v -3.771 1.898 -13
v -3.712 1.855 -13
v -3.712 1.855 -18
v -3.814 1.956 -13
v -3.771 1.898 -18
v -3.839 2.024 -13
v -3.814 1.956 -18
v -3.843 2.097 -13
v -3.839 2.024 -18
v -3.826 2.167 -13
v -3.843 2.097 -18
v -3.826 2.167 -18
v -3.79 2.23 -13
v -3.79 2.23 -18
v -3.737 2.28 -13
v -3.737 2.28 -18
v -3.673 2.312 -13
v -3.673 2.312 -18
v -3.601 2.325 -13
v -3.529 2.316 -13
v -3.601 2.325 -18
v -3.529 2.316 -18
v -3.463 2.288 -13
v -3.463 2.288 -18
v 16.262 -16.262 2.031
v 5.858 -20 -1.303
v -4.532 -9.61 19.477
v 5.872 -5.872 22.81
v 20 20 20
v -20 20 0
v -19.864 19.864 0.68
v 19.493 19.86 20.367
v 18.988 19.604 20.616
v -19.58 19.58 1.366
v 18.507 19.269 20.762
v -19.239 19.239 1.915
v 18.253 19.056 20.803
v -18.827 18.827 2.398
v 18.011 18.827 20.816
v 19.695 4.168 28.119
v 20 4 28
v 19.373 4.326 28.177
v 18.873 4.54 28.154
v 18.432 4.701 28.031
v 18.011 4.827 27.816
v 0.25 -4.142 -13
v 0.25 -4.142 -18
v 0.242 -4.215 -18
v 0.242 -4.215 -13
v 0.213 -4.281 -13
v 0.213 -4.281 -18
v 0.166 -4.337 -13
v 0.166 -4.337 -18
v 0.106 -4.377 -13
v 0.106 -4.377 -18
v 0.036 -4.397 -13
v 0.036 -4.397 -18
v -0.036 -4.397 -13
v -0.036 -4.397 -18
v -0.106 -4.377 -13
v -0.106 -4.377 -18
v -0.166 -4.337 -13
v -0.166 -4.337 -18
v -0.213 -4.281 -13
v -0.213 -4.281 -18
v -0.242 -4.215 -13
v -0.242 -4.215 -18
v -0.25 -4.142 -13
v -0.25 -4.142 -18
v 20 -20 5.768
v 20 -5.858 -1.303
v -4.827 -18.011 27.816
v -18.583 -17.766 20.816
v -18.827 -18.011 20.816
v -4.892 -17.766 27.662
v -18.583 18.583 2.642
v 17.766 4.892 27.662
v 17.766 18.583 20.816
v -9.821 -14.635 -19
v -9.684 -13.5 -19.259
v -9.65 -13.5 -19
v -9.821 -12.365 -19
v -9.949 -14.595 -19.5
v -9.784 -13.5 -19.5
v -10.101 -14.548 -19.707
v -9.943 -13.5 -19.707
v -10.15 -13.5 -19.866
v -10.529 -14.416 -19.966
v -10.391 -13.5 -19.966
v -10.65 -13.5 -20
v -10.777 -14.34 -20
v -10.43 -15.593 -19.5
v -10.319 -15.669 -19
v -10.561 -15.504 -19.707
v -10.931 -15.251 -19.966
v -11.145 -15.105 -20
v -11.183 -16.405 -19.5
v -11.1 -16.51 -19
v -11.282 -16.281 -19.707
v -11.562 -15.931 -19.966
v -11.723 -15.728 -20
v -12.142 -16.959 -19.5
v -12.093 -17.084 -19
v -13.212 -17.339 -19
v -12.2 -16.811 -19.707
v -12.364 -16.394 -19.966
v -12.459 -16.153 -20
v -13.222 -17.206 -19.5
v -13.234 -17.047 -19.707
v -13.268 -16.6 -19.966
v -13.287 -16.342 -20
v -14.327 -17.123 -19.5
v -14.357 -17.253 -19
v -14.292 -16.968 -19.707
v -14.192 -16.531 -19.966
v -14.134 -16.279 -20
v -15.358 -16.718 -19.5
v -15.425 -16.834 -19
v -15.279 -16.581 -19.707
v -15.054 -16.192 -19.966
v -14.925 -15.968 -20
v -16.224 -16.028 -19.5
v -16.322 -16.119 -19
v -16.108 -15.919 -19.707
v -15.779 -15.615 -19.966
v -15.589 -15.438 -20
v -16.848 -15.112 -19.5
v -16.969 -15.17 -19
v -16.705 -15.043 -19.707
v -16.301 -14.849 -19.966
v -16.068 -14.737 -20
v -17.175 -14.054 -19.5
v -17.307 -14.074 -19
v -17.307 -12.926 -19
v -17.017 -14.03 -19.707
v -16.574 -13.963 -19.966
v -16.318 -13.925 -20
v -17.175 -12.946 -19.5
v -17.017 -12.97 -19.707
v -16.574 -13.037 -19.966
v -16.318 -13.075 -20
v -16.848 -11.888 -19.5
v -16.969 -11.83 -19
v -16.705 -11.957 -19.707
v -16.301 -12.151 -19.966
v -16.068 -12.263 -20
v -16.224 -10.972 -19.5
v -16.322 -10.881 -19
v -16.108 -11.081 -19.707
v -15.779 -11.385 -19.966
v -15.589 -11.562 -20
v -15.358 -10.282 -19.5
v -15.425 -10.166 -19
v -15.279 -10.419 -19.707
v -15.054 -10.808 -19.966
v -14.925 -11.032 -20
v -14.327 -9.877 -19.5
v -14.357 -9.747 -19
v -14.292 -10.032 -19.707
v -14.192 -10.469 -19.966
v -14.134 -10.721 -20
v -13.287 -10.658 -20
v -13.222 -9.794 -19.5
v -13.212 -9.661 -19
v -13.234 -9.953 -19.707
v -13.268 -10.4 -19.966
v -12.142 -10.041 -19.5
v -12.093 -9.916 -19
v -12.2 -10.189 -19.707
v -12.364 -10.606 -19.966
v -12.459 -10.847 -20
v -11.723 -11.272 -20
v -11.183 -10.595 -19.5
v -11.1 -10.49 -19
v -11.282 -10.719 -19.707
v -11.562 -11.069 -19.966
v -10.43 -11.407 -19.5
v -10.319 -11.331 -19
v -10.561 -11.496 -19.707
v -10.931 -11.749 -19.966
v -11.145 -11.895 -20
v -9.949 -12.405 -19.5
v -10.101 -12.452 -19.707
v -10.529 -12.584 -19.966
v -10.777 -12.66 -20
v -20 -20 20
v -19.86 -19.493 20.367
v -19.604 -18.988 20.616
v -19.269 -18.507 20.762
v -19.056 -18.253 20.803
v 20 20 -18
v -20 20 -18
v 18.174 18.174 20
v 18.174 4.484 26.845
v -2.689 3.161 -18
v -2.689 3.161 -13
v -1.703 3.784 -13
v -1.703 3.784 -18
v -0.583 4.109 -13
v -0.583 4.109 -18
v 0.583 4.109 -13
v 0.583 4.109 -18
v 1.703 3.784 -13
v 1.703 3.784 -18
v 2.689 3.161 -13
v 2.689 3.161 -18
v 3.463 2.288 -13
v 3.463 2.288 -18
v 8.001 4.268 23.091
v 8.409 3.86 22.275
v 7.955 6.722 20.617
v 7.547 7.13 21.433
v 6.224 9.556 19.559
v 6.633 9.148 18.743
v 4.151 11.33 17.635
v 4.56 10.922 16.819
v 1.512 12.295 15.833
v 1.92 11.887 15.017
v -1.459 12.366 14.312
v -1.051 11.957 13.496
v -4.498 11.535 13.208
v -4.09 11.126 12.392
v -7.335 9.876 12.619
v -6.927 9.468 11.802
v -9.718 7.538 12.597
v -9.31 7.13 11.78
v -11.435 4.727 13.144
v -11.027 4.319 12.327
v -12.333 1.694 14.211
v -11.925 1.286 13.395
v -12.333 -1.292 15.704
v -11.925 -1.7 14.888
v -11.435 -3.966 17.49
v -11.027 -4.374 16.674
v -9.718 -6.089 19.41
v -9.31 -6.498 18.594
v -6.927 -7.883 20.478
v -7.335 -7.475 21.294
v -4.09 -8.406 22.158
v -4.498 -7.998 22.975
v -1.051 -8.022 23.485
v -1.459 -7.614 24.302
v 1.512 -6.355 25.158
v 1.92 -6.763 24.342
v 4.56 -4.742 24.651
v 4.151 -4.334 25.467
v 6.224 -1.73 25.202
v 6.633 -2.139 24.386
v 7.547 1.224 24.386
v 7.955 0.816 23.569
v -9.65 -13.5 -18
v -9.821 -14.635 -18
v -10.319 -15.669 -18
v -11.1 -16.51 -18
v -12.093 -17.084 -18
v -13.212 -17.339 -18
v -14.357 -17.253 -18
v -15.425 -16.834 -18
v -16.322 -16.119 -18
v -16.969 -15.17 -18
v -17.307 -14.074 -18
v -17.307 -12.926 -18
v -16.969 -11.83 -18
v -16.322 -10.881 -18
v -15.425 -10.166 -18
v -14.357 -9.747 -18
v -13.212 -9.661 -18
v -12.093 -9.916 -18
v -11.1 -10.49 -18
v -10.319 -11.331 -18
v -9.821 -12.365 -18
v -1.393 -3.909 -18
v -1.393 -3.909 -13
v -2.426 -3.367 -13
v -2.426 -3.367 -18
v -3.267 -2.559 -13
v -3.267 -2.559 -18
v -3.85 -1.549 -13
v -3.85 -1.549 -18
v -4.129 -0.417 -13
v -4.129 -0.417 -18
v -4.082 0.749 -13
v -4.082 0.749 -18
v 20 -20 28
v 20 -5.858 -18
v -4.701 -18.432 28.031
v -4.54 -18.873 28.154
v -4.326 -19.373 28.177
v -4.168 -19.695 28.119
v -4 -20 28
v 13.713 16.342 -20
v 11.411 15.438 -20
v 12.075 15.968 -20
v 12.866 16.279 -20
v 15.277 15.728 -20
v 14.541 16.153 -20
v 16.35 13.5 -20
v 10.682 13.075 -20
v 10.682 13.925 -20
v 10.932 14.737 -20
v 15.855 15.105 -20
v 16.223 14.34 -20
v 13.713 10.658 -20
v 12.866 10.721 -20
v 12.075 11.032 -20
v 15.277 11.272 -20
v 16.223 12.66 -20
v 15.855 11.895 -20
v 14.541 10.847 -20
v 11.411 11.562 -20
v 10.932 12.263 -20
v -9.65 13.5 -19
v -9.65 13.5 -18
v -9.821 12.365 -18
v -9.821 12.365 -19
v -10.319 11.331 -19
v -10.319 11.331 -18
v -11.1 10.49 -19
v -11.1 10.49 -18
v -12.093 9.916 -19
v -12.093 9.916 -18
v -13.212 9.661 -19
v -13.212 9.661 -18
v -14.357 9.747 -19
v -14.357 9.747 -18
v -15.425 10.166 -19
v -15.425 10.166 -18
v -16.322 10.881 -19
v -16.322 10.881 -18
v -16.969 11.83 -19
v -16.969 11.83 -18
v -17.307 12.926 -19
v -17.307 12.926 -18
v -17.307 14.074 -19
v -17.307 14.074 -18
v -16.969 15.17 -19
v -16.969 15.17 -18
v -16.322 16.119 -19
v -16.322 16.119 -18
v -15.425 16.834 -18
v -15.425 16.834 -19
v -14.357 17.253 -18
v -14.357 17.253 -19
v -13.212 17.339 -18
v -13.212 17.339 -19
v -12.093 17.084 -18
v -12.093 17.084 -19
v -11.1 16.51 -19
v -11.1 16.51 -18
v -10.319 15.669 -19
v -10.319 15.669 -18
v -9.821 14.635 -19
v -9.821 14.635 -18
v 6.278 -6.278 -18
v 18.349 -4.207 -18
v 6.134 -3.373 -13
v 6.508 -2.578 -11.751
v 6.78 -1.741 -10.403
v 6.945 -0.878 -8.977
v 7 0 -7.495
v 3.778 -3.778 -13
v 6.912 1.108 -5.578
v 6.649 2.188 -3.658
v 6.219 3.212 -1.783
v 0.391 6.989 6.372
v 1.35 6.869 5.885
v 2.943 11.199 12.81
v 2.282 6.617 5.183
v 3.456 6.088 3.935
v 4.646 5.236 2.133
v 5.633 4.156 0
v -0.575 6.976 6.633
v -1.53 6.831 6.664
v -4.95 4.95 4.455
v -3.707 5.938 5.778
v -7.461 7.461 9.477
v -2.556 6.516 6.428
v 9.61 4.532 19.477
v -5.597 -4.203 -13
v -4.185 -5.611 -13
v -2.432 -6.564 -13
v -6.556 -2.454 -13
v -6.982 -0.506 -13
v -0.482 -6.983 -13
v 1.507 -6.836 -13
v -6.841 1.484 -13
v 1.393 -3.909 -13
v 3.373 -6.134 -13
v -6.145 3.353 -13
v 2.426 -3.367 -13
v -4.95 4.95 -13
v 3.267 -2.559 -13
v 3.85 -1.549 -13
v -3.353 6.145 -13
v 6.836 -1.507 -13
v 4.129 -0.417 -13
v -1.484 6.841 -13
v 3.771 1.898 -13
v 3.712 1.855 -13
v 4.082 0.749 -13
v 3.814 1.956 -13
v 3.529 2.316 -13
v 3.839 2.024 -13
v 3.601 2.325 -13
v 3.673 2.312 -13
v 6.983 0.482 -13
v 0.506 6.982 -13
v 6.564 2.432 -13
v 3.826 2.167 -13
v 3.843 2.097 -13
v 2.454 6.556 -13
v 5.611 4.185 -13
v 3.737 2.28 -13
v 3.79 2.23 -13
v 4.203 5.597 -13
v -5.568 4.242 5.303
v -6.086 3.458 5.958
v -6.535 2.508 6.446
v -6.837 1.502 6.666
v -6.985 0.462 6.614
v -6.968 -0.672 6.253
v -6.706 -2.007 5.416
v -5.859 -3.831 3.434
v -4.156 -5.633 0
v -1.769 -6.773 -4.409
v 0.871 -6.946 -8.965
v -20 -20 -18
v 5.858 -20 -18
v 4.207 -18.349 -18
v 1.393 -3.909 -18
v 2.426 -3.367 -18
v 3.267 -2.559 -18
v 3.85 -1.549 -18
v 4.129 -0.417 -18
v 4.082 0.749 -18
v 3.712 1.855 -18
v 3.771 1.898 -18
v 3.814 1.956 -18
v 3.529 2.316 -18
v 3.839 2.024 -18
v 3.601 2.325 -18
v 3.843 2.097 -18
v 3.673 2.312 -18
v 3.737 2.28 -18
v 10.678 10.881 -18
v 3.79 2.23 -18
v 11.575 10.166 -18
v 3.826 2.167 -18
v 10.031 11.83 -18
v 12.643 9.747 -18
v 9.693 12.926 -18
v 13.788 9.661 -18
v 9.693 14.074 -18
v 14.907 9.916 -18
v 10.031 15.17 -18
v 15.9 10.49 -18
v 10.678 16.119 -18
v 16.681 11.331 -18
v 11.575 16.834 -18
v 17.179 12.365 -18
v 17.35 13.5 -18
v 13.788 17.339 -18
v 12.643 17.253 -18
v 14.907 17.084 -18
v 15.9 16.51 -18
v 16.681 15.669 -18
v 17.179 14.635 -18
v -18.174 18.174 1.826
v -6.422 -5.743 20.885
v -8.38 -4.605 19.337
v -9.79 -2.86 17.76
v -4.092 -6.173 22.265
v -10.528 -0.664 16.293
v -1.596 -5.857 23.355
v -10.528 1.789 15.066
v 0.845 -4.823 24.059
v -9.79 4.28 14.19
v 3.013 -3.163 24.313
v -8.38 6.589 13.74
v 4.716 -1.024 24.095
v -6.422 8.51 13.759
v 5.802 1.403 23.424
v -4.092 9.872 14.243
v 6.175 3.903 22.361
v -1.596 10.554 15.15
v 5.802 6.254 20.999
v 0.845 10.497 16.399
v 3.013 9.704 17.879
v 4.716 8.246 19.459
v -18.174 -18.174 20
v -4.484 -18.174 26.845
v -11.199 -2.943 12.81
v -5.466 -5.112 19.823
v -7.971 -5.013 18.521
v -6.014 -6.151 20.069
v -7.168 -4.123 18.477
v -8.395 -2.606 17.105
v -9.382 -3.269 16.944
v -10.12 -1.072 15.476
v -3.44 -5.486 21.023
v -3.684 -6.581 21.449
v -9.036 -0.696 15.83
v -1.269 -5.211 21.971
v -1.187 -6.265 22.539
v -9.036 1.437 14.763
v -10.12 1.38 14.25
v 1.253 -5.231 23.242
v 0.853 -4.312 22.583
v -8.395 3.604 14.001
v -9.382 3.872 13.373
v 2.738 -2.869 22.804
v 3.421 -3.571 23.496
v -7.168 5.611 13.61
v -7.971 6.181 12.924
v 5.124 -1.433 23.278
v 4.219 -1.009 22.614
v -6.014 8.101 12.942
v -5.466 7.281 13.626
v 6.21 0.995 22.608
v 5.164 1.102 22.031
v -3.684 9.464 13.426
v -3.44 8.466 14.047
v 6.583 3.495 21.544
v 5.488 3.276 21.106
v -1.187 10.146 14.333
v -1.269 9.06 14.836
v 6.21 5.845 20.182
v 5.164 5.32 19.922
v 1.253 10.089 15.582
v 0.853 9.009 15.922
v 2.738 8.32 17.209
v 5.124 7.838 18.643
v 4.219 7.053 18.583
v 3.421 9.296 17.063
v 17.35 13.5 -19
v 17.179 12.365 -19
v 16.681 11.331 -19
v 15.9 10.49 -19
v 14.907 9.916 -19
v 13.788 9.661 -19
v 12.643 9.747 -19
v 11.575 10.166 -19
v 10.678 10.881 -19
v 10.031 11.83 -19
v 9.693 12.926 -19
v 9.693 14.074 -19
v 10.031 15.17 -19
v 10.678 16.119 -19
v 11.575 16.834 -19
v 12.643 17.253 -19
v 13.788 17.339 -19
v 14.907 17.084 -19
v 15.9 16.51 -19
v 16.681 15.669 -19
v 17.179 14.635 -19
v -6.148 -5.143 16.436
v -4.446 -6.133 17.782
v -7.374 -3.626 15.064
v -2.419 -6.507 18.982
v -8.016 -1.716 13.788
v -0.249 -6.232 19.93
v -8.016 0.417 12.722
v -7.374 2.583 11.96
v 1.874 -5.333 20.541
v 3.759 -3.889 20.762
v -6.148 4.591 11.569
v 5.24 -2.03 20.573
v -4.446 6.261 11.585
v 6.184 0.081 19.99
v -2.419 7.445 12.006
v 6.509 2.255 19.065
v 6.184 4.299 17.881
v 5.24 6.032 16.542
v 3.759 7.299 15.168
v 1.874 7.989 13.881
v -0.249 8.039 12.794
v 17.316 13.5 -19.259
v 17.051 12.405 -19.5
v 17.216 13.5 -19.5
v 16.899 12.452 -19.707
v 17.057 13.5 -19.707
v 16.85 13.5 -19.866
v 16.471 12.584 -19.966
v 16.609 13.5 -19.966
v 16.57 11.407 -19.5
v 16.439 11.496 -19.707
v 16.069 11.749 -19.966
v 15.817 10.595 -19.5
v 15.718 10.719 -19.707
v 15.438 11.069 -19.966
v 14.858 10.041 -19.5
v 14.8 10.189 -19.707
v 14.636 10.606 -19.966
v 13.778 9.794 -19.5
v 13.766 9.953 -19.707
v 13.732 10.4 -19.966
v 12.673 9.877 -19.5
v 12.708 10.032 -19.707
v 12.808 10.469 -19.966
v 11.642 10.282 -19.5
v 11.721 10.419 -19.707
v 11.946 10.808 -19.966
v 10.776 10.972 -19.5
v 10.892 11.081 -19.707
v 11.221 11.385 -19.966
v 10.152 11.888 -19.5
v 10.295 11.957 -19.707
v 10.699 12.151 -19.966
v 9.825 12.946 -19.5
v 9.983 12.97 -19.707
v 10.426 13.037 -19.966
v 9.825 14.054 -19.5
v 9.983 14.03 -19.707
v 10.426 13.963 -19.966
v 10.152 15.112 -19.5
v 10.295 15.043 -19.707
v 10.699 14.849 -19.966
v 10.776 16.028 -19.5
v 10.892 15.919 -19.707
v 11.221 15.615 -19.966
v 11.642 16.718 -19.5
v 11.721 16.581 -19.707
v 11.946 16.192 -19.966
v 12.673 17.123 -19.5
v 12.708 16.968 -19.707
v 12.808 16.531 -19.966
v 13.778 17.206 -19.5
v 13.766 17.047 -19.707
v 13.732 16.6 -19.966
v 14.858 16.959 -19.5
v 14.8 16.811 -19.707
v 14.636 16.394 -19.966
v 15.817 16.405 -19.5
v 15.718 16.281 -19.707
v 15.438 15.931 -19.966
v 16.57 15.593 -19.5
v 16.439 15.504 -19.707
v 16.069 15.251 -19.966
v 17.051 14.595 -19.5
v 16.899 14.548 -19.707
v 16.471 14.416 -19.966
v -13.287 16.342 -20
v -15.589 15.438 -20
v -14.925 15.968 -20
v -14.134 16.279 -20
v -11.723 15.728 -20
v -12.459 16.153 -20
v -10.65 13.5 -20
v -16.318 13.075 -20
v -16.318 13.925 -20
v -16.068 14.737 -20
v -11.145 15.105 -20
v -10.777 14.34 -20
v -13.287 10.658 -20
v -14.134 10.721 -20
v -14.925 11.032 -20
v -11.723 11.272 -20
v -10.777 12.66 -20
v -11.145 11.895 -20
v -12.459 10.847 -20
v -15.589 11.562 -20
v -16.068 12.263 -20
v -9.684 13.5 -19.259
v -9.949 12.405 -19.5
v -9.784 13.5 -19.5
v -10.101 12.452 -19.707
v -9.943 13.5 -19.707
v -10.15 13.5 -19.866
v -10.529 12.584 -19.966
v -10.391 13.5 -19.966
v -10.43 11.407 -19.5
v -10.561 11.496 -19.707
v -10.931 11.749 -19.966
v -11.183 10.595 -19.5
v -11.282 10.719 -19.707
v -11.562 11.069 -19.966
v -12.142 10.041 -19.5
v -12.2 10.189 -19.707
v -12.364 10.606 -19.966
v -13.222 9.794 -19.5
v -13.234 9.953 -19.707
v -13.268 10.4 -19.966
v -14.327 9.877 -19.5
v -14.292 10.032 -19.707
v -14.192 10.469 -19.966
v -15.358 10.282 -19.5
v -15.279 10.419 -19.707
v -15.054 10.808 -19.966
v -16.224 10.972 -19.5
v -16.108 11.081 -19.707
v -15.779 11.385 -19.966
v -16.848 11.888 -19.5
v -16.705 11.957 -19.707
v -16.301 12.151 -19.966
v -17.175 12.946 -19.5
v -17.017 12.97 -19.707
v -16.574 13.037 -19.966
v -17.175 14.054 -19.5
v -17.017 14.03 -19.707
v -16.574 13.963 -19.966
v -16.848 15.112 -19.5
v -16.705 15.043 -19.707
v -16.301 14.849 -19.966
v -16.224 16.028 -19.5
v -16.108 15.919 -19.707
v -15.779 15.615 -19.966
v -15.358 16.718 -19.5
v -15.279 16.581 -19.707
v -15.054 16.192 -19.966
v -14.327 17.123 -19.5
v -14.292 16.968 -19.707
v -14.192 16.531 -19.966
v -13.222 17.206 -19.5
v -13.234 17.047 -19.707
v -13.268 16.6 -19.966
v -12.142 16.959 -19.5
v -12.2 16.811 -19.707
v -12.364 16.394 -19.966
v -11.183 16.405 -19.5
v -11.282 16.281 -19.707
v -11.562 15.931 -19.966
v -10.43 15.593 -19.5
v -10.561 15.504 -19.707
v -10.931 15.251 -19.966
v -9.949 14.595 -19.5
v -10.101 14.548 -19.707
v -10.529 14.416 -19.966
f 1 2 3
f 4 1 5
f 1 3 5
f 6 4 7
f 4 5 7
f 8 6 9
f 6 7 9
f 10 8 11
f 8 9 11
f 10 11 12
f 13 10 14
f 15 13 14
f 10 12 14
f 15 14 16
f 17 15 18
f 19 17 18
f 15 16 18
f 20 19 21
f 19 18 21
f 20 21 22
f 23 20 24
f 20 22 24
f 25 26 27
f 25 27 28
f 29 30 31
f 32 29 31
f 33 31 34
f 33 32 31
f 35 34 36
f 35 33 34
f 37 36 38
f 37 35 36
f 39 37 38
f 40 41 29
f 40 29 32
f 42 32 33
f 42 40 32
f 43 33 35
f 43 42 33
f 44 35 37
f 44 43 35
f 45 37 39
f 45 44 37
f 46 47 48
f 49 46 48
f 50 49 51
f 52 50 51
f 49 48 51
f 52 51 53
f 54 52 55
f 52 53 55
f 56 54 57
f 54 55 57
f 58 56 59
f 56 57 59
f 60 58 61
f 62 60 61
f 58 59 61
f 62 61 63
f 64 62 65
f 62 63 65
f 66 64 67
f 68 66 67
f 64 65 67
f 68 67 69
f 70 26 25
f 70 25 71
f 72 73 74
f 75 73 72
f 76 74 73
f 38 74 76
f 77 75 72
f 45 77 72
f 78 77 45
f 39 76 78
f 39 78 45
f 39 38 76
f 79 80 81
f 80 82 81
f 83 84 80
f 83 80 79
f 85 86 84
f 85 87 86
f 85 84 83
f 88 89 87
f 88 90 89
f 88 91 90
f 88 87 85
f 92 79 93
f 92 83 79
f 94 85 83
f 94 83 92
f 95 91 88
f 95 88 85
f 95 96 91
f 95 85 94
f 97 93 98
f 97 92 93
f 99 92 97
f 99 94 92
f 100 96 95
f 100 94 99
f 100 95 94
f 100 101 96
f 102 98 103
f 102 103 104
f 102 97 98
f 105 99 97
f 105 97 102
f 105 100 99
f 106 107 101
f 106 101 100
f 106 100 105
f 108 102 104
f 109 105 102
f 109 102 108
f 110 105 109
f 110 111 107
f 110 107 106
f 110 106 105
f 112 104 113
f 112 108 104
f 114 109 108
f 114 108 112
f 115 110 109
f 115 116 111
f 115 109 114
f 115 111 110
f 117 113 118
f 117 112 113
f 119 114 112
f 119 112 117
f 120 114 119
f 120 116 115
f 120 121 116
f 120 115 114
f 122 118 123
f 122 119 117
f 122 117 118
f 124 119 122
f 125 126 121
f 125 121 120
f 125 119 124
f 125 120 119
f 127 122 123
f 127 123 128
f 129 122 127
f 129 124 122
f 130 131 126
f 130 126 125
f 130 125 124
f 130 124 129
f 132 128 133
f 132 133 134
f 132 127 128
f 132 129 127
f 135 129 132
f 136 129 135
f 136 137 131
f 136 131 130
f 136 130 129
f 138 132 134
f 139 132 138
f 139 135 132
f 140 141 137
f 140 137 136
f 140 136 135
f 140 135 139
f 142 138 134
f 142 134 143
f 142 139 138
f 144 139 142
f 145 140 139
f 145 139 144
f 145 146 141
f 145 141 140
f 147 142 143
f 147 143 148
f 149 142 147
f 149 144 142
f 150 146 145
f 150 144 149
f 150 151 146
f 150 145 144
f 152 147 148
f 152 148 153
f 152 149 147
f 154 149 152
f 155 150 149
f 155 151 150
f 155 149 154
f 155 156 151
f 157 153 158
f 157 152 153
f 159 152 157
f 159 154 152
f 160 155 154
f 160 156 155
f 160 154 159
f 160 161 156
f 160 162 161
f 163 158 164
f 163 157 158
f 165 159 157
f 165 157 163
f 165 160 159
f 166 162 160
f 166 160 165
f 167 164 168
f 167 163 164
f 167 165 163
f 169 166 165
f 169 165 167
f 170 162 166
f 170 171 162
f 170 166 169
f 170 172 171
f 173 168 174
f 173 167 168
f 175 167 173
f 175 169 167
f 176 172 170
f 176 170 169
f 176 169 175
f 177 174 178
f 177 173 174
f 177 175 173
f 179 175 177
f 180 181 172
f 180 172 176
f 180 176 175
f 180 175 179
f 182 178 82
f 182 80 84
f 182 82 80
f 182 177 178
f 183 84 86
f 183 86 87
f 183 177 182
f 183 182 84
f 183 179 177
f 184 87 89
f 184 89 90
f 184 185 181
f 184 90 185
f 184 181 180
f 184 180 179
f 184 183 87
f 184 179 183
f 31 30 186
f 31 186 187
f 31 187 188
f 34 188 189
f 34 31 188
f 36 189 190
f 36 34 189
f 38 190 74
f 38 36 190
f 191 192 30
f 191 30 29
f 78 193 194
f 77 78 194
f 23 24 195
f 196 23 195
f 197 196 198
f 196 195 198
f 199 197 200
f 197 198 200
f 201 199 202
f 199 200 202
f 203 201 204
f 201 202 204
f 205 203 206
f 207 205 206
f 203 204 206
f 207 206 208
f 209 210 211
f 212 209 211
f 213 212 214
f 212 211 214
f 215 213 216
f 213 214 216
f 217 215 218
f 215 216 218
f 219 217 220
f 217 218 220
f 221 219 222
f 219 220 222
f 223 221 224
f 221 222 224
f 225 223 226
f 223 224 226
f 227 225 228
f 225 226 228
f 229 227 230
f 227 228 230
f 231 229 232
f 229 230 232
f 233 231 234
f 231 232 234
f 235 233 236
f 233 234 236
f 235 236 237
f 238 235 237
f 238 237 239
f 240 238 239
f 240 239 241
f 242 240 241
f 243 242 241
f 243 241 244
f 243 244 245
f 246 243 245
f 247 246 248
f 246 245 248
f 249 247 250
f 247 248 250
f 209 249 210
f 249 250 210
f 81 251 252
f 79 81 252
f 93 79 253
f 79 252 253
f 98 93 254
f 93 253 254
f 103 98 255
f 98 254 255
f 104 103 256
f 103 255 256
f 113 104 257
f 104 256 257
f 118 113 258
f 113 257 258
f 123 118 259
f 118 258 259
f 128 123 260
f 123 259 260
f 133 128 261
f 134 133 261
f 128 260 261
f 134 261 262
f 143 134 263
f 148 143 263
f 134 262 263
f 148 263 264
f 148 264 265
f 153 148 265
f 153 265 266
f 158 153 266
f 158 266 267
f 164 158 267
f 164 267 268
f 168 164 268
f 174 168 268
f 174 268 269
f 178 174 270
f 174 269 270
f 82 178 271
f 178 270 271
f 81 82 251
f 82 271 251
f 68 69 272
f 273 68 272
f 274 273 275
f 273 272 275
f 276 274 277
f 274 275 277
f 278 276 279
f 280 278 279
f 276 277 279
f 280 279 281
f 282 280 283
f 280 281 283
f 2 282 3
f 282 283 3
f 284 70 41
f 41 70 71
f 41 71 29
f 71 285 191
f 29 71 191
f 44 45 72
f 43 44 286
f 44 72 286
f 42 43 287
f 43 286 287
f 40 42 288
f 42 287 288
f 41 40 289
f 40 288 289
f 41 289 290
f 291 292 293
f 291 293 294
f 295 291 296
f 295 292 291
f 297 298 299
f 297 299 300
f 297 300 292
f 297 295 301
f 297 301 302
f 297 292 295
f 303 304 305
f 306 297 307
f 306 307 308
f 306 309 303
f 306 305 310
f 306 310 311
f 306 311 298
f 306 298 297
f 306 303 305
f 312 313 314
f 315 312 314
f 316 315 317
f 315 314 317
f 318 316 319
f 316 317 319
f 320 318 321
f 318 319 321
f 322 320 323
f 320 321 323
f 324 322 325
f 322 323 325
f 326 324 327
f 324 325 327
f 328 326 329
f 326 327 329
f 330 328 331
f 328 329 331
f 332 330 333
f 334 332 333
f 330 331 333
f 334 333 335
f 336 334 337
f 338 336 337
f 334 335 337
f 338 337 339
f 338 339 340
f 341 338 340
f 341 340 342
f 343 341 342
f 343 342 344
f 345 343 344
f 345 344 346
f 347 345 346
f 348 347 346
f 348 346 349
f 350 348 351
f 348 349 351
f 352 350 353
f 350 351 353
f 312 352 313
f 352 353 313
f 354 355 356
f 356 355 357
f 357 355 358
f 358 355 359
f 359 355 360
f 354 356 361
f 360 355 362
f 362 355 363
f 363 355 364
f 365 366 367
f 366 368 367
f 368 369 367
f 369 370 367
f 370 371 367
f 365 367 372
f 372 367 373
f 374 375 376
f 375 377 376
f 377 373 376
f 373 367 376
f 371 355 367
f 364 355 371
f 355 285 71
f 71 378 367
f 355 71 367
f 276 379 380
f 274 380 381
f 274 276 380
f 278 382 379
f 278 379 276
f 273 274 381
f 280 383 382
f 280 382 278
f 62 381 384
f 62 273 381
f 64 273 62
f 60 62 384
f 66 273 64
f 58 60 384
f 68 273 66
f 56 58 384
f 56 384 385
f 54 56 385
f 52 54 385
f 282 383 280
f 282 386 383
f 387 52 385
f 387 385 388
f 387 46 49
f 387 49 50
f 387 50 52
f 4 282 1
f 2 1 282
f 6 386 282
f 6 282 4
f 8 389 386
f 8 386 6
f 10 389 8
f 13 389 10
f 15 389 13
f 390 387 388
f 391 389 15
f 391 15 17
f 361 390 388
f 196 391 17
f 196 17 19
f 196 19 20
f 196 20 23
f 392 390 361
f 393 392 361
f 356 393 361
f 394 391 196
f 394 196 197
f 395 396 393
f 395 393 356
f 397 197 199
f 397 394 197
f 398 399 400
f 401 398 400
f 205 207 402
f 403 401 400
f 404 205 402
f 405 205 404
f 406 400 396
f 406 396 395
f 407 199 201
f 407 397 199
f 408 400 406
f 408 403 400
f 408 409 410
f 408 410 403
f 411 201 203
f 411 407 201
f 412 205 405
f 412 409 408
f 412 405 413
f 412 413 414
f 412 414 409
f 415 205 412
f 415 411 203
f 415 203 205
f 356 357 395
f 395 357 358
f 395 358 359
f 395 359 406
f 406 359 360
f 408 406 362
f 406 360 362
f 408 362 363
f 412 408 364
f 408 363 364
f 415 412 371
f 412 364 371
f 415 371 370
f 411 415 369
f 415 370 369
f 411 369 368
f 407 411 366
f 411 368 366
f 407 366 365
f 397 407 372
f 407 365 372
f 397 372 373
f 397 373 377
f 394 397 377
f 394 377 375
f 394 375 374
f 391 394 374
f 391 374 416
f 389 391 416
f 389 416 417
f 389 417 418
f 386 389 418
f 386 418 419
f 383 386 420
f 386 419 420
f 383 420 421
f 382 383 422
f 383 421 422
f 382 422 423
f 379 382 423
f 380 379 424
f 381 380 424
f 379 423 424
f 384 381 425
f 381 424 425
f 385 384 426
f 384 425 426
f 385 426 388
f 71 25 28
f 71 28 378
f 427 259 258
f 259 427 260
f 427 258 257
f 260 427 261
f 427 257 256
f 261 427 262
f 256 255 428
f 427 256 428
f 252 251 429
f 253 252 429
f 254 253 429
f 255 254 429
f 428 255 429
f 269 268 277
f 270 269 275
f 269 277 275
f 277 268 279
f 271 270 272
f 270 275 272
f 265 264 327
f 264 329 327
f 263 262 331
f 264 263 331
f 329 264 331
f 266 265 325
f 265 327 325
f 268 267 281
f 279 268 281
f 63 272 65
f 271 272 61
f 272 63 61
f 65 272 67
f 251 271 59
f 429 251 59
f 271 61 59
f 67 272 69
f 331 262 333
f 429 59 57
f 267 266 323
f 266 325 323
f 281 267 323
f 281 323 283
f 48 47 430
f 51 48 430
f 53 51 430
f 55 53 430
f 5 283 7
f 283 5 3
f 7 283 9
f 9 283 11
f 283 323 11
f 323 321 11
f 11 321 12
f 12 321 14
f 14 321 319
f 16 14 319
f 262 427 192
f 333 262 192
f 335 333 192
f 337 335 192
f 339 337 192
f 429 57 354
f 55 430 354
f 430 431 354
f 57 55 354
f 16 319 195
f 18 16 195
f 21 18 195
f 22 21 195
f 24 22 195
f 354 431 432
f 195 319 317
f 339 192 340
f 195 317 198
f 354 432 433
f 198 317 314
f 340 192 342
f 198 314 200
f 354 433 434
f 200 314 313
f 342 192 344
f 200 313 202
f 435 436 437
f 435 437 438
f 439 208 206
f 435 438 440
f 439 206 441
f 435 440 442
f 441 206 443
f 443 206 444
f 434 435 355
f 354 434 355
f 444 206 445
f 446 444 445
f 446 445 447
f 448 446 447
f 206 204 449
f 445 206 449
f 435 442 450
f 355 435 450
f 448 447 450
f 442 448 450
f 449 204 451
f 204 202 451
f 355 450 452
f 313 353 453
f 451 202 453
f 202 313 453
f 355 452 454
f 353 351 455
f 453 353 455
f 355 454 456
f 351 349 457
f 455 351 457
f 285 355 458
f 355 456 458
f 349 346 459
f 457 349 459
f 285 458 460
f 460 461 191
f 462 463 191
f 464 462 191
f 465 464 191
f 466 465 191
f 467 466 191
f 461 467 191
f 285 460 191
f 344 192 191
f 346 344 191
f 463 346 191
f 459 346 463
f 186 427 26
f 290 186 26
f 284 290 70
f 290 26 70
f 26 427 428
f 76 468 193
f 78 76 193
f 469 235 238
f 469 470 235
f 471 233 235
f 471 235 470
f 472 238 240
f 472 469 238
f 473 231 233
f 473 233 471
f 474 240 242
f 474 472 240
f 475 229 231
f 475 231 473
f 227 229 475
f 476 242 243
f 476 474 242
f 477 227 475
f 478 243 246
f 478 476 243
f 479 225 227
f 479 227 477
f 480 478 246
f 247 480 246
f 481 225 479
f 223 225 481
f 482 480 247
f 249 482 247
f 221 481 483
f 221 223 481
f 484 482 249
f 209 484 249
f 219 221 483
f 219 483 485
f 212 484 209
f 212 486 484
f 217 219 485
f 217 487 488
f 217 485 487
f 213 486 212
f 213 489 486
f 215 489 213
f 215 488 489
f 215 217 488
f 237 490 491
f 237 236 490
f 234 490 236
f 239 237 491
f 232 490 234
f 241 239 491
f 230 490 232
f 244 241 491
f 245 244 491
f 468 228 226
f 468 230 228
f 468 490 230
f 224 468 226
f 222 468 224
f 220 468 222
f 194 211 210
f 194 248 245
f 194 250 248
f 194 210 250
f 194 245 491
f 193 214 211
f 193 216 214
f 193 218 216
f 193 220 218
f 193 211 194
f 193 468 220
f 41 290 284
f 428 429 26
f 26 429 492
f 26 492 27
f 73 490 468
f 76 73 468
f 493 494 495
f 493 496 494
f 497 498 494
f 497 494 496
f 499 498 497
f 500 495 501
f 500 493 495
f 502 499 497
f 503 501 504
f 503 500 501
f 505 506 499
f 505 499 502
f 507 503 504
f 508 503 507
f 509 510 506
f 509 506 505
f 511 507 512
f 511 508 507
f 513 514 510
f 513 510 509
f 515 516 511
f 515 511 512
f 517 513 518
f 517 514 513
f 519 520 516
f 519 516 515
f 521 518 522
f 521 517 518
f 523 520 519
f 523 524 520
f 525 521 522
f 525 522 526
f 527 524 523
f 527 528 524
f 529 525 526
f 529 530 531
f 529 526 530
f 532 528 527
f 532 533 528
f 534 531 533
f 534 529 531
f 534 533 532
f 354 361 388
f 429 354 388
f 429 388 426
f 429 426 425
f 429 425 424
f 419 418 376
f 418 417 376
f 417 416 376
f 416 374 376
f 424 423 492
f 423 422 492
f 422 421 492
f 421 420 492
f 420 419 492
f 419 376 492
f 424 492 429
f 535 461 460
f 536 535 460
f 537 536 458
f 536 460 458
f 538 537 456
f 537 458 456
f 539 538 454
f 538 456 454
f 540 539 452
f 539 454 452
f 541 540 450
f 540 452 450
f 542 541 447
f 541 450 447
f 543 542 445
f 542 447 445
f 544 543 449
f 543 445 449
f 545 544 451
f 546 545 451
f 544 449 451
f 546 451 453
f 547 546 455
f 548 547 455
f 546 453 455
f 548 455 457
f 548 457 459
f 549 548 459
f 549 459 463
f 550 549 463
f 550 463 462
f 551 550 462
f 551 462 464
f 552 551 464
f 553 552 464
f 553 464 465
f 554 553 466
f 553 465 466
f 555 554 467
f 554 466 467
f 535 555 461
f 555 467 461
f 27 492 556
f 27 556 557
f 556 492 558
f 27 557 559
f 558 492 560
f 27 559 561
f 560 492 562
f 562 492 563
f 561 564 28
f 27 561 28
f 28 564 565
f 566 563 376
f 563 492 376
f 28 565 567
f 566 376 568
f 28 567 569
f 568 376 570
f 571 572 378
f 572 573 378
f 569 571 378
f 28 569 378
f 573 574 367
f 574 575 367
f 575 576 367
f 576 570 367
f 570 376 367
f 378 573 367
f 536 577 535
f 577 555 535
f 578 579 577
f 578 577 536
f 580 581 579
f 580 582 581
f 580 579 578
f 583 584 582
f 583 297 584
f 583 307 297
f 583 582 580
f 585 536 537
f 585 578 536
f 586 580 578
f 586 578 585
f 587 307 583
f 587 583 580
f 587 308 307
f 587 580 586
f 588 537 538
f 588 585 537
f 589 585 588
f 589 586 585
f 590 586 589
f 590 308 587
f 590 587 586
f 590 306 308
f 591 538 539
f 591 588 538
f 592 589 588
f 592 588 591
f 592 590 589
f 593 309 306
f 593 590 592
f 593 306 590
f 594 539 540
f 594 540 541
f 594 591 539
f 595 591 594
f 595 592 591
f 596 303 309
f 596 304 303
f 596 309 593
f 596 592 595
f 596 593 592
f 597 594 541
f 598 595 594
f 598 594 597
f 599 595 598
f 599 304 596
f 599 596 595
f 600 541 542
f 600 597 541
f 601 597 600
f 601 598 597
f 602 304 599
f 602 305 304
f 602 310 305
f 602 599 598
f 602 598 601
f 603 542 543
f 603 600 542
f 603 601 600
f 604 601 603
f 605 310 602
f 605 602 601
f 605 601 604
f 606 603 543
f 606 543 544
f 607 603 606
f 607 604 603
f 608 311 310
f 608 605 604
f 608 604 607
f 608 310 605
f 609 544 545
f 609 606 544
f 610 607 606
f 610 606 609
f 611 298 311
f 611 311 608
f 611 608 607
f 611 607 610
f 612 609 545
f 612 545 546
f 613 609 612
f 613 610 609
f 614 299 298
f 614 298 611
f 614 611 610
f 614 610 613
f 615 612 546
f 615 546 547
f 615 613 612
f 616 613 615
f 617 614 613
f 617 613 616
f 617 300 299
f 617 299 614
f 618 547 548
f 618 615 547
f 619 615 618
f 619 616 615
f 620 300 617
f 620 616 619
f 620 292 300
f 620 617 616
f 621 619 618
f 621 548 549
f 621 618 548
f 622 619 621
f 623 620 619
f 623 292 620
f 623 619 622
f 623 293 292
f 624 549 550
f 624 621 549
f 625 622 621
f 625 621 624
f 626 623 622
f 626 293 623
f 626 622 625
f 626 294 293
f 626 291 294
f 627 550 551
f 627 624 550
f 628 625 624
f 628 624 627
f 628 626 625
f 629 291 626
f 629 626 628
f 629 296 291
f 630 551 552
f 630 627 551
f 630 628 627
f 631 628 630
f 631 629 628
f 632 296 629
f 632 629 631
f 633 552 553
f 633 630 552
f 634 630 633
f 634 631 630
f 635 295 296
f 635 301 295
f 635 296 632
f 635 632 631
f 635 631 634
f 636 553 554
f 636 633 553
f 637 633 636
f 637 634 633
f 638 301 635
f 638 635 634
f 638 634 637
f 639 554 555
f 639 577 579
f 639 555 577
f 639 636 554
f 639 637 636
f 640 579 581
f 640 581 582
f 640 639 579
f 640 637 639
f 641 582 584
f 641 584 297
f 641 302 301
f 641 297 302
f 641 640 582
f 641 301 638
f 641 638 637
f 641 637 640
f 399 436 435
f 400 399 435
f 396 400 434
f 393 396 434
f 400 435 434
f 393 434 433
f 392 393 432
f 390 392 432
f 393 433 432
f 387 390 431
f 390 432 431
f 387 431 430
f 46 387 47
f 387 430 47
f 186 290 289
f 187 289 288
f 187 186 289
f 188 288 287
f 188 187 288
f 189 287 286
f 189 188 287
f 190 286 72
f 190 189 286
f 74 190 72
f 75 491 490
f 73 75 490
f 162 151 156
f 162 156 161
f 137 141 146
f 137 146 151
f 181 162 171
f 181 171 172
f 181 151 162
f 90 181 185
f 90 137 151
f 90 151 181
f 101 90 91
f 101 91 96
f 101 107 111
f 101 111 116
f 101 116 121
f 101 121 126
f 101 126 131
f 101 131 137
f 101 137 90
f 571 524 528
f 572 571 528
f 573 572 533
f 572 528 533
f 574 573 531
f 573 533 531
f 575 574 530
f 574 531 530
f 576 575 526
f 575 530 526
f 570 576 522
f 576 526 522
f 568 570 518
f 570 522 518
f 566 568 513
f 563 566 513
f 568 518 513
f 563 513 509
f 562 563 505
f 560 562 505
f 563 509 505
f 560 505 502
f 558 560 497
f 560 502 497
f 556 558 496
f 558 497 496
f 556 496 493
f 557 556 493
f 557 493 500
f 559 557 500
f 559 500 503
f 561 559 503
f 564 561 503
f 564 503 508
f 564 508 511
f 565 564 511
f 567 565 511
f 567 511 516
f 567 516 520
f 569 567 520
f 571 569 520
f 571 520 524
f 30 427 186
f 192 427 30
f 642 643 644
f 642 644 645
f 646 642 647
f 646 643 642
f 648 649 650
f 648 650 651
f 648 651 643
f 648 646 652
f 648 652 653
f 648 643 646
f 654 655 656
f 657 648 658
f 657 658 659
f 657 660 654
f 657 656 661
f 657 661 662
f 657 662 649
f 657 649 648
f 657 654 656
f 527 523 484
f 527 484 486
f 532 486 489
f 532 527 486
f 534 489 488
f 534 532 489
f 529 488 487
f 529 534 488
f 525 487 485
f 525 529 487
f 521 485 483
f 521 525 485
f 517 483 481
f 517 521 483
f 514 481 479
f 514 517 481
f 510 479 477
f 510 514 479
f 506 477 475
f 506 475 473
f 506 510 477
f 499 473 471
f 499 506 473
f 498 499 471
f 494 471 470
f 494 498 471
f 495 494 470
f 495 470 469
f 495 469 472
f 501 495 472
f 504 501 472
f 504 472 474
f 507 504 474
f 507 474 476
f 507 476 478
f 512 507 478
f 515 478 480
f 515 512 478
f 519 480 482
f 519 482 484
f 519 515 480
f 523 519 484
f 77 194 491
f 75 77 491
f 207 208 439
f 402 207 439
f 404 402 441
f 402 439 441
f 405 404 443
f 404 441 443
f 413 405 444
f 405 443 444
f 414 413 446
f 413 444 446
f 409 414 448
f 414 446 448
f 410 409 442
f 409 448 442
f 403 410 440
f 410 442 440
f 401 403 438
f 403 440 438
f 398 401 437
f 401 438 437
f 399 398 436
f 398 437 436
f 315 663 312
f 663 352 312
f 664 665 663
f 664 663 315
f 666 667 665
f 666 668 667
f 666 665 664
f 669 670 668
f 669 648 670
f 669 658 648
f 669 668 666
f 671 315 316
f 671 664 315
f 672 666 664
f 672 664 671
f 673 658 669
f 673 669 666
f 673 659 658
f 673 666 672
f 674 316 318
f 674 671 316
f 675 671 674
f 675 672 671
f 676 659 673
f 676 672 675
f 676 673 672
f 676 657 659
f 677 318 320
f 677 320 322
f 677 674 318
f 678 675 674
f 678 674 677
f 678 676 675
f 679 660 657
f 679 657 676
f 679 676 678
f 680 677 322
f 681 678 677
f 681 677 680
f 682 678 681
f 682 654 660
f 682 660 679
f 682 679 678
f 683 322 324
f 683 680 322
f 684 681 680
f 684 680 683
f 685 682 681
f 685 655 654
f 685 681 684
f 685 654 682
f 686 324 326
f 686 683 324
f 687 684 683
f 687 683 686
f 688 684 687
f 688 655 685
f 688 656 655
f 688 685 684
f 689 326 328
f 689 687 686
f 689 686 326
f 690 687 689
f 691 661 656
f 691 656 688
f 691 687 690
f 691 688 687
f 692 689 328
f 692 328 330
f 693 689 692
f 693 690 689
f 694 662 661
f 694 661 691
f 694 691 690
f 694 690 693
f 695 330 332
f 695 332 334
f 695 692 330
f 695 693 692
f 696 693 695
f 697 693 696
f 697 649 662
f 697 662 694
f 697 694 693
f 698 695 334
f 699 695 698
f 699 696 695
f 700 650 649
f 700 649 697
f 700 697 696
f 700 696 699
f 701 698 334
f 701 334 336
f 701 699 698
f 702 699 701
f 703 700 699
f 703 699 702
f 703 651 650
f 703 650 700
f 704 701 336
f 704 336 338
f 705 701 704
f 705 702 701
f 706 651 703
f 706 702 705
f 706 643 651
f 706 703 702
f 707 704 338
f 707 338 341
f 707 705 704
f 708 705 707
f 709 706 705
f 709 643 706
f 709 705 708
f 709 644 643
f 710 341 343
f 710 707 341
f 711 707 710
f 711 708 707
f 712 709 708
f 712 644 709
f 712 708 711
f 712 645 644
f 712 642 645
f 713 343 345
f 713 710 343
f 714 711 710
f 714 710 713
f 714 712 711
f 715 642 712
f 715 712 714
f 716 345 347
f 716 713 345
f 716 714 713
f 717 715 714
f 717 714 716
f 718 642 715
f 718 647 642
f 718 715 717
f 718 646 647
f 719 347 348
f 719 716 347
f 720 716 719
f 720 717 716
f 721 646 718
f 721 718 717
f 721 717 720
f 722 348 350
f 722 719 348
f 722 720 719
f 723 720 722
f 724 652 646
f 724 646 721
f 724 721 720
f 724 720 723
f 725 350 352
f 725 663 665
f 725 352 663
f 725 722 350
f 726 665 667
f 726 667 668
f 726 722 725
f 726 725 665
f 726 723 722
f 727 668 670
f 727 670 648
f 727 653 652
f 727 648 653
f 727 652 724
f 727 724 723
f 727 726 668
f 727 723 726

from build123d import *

# Parameters (mm, degrees)
F0_W         = 40
F0_H         = 40
F1_DEPTH     = 20
F3_DEPTH     = 18
F4_DEPTH     = 8
F5_R         = 48.402363322
F6_DEPTH     = 25
F7_R         = 8
F8_DEPTH     = 47.3578016938
F11_DEPTH    = 37.5
F12_DEPTH    = 12.05
F13_R        = 3.85
F14_DEPTH    = 2
F15_DEPTH    = 25
F16_R        = 7
F17_DEPTH    = 13
F18_DEPTH    = 18.5
F19_R        = 1
F20_R        = 11.2
F20_R_2      = 9.2
F21_DEPTH    = 1
F22_T1_DEPTH = 26.5487978578
F22_T3_DEPTH = 53.3816135878
F22_T5_DEPTH = 53.3816135878
F22_T7_DEPTH = 26.5487978578
F22_T9_DEPTH = 42.6013795348


# Not quite as in the source:
# - a fillet or chamfer that OpenCascade refuses, or shapes differently, is made with other operations: its cross-section is extruded or revolved along the edge and cut away or added


with BuildPart() as f1:
    # F0 (on Top) → F1 (new body)
    with BuildSketch(Plane.XY):
        Rectangle(F0_W, F0_H)
    extrude(amount=F1_DEPTH)

    # F3 (add): a face of the model
    f3_faces = [f1.faces().sort_by_distance(p)[0] for p in [
        (0, 0, 0),
    ]]
    extrude(f3_faces, amount=F3_DEPTH)

    # F4 (add): a face of the model
    f4_faces = [f1.faces().sort_by_distance(p)[0] for p in [
        (0, 0, 20),
    ]]
    extrude(f4_faces, amount=F4_DEPTH)

    # F5 (on 3pt) → F6 (cut)
    with BuildSketch(Plane(origin=(-6.6666666667, 6.6666666667, 13.3333333333), x_dir=(0.9128709292, 0.1825741858, 0.3651483717), z_dir=(-0.4082482905, 0.4082482905, 0.8164965809))):
        with Locations((2.3868493736, -7.4885585345)):
            Circle(F5_R)
    extrude(amount=F6_DEPTH, mode=Mode.SUBTRACT)

    # F7 (on face) → F8 (cut, through all)
    with BuildSketch(Plane(origin=(-6.6666666667, 6.6666666667, 13.3333333333), x_dir=(0.9128709292, 0.1825741858, 0.3651483717), z_dir=(-0.4082482905, 0.4082482905, 0.8164965809))):
        with Locations((5.3147843089, -6.5092548249)):
            Circle(F7_R)
    extrude(amount=-F8_DEPTH, mode=Mode.SUBTRACT)

    # F10 (on offset) → F11 (cut, symmetric)
    with BuildSketch(Plane(origin=(9.6632649519, -9.6632649519, -19.3265299038), x_dir=(0.9128709292, 0.1825741858, 0.3651483717), z_dir=(-0.4082482905, 0.4082482905, 0.8164965809))):
        Polygon((16.712234718, -4.6568354596), (9.4092672846, 4.2874364504), (-1.9881831245, 2.4350170851), (-6.0826661002, -8.3616741902), (1.2203013332, -17.3059461002), align=None)
        Polygon((12.6177517423, -15.4535267349), (16.712234718, -4.6568354596), (1.2203013332, -17.3059461002), align=None)
    extrude(amount=F11_DEPTH, both=True, mode=Mode.SUBTRACT)

    # F10 (on offset) → F12 (cut)
    with BuildSketch(Plane(origin=(9.6632649519, -9.6632649519, -19.3265299038), x_dir=(0.9128709292, 0.1825741858, 0.3651483717), z_dir=(-0.4082482905, 0.4082482905, 0.8164965809))):
        Polygon((44.0977028976, 17.7033056762), (16.712234718, -4.6568354596), (12.6177517423, -15.4535267349), (1.2203013332, -17.3059461002), (-18.4589771374, -33.3740096866), (-1.5124044388, -54.1292376868), (61.0442755962, -3.051922324), align=None)
    extrude(amount=F12_DEPTH, mode=Mode.SUBTRACT)

    # F13 (on face) → F14 (join)
    with BuildSketch(Plane(origin=(0, 0, -18), x_dir=(1, 0, 0), z_dir=(0, 0, -1))):
        with Locations((-13.5, 13.5)):
            Circle(F13_R)
        with Locations((-13.5, -13.5)):
            Circle(F13_R)
        with Locations((13.5, -13.5)):
            Circle(F13_R)
    extrude(amount=F14_DEPTH)

    # F13 (on face) → F15 (cut)
    with BuildSketch(Plane(origin=(0, 0, -18), x_dir=(1, 0, 0), z_dir=(0, 0, -1))):
        with BuildLine():
            ThreePointArc((0.2498865688, 4.1424698795), (0, 4.4), (-0.2498865688, 4.1424698795))
            ThreePointArc((-0.2498865688, 4.1424698795), (-3.5940054257, 2.075), (-3.7124274345, -1.8548268231))
            ThreePointArc((-3.7124274345, -1.8548268231), (-3.8105117767, -2.2), (-3.4625408657, -2.2876430564))
            ThreePointArc((-3.4625408657, -2.2876430564), (0, -4.15), (3.4625408657, -2.2876430564))
            ThreePointArc((3.4625408657, -2.2876430564), (3.8105117767, -2.2), (3.7124274345, -1.8548268231))
            ThreePointArc((3.7124274345, -1.8548268231), (3.5940054257, 2.075), (0.2498865688, 4.1424698795))
        make_face()
    extrude(amount=-F15_DEPTH, mode=Mode.SUBTRACT)

    # F16 (on Top) → F17 (cut)
    with BuildSketch(Plane.XY):
        Circle(F16_R)
    extrude(amount=-F17_DEPTH, mode=Mode.SUBTRACT)

    # F16 (on Top) → F18 (cut)
    with BuildSketch(Plane.XY):
        Circle(F16_R)
    extrude(amount=F18_DEPTH, mode=Mode.SUBTRACT)

    # F19
    f19_edges = [f1.edges().sort_by_distance(p)[0] for p in [
        (-17.35, 13.5, -20),
        (-17.35, -13.5, -20),
        (9.65, 13.5, -20),
    ]]
    fillet(f19_edges, radius=F19_R)

    # F20 (on face) → F21 (join)
    with BuildSketch(Plane(origin=(-6.6666666667, 6.6666666667, 13.3333333333), x_dir=(0.9128709292, 0.1825741858, 0.3651483717), z_dir=(-0.4082482905, 0.4082482905, 0.8164965809))):
        Polygon((2.9211869734, -30.410524494), (29.2118697336, -8.94427191), (29.2118697336, 8.94427191), (-14.6059348668, 17.88854382), (-14.6059348668, -26.83281573), align=None)
        Polygon((27.2118697336, -7.9952761744), (2.3913648452, -28.2611335526), (-12.6059348668, -25.1998225681), (-12.6059348668, 15.4390540772), (27.2118697336, 7.3112787481), align=None, mode=Mode.SUBTRACT)
        with Locations((5.3147843089, -6.5092548249)):
            Circle(F20_R)
        with Locations((5.3147843089, -6.5092548249)):
            Circle(F20_R_2, mode=Mode.SUBTRACT)
    extrude(amount=F21_DEPTH)

    # F22: fillet of radius 2 on 5 edges, made by hand

    # F22_s2 → F22_t1 (cut)
    with BuildSketch(Plane(origin=(-11.8729833462, 0, -5.9364916731), x_dir=(0, 1, 0), z_dir=(0.894427191, 0, 0.4472135955))):
        with BuildLine():
            ThreePointArc((-20, 26.83281573), (-19.0328736084, 27.2022251402), (-18.0106128795, 27.038579878))
            Line((-18.0106128795, 27.038579878), (-17.9942829478, 27.0750947152))
            Line((-17.9942829478, 27.0750947152), (-19.5754217779, 27.7822014963))
            Line((-19.5754217779, 27.7822014963), (-19.6282665467, 27.7620165908))
            ThreePointArc((-19.6282665467, 27.7620165908), (-19.8323906919, 27.3055811262), (-20.0234578108, 26.8652152842))
            Line((-20.0234578108, 26.8652152842), (-20, 26.83281573))
        make_face()
    extrude(amount=F22_T1_DEPTH, mode=Mode.SUBTRACT)

    # F22_s4 → F22_t3 (cut)
    with BuildSketch(Plane(origin=(0, 19.8729833462, -9.9364916731), x_dir=(1, 0, 0), z_dir=(0, -0.894427191, 0.4472135955))):
        with BuildLine():
            ThreePointArc((-20, 8.94427191), (-19.6305905898, 9.9113983016), (-18.8271094604, 10.5642496204))
            Line((-18.8271094604, 10.5642496204), (-18.843439392, 10.6007644575))
            Line((-18.843439392, 10.6007644575), (-20.4245782221, 9.8936576763))
            Line((-20.4245782221, 9.8936576763), (-20.4447631276, 9.8408129076))
            ThreePointArc((-20.4447631276, 9.8408129076), (-20.2406389824, 9.384377443), (-20.0397877424, 8.948387193))
            Line((-20.0397877424, 8.948387193), (-20, 8.94427191))
        make_face()
    extrude(amount=F22_T3_DEPTH, mode=Mode.SUBTRACT)

    # F22_s6 → F22_t5 (cut)
    with BuildSketch(Plane(origin=(27.8729833462, 0, 13.9364916731), x_dir=(0, 1, 0), z_dir=(-0.894427191, 0, -0.4472135955))):
        with BuildLine():
            ThreePointArc((20, -8.94427191), (19.6305905898, -9.9113983016), (18.8271094604, -10.5642496204))
            Line((18.8271094604, -10.5642496204), (18.843439392, -10.6007644575))
            Line((18.843439392, -10.6007644575), (20.4245782221, -9.8936576763))
            Line((20.4245782221, -9.8936576763), (20.4447631276, -9.8408129076))
            ThreePointArc((20.4447631276, -9.8408129076), (20.2406389824, -9.384377443), (20.0397877424, -8.948387193))
            Line((20.0397877424, -8.948387193), (20, -8.94427191))
        make_face()
    extrude(amount=F22_T5_DEPTH, mode=Mode.SUBTRACT)

    # F22_s8 → F22_t7 (cut)
    with BuildSketch(Plane(origin=(0, -11.8729833462, 5.9364916731), x_dir=(1, 0, 0), z_dir=(0, 0.894427191, -0.4472135955))):
        with BuildLine():
            ThreePointArc((20, -26.83281573), (19.0328736084, -27.2022251402), (18.0106128795, -27.038579878))
            Line((18.0106128795, -27.038579878), (17.9942829478, -27.0750947152))
            Line((17.9942829478, -27.0750947152), (19.5754217779, -27.7822014963))
            Line((19.5754217779, -27.7822014963), (19.6282665467, -27.7620165908))
            ThreePointArc((19.6282665467, -27.7620165908), (19.8323906919, -27.3055811262), (20.0234578108, -26.8652152842))
            Line((20.0234578108, -26.8652152842), (20, -26.83281573))
        make_face()
    extrude(amount=F22_T7_DEPTH, mode=Mode.SUBTRACT)

    # F22_s10 → F22_t9 (cut)
    with BuildSketch(Plane(origin=(-15.0618621785, -15.0618621785, 0), x_dir=(0, 0, 1), z_dir=(0.7071067812, 0.7071067812, 0))):
        with BuildLine():
            ThreePointArc((27.8164965809, 9.3221446674), (28.1750672506, 10.2933417867), (28, 11.313708499))
            Line((28, 11.313708499), (28.0363299316, 11.3304457648))
            ThreePointArc((28.0363299316, 11.3304457648), (28.4313423012, 11.0576932276), (28.8395905917, 10.769018093))
            Line((28.8395905917, 10.769018093), (28.8491564442, 10.713264219))
            Line((28.8491564442, 10.713264219), (27.8491564442, 9.2990506567))
            Line((27.8491564442, 9.2990506567), (27.8164965809, 9.3221446674))
        make_face()
    extrude(amount=F22_T9_DEPTH, mode=Mode.SUBTRACT)


solid = f1.part
